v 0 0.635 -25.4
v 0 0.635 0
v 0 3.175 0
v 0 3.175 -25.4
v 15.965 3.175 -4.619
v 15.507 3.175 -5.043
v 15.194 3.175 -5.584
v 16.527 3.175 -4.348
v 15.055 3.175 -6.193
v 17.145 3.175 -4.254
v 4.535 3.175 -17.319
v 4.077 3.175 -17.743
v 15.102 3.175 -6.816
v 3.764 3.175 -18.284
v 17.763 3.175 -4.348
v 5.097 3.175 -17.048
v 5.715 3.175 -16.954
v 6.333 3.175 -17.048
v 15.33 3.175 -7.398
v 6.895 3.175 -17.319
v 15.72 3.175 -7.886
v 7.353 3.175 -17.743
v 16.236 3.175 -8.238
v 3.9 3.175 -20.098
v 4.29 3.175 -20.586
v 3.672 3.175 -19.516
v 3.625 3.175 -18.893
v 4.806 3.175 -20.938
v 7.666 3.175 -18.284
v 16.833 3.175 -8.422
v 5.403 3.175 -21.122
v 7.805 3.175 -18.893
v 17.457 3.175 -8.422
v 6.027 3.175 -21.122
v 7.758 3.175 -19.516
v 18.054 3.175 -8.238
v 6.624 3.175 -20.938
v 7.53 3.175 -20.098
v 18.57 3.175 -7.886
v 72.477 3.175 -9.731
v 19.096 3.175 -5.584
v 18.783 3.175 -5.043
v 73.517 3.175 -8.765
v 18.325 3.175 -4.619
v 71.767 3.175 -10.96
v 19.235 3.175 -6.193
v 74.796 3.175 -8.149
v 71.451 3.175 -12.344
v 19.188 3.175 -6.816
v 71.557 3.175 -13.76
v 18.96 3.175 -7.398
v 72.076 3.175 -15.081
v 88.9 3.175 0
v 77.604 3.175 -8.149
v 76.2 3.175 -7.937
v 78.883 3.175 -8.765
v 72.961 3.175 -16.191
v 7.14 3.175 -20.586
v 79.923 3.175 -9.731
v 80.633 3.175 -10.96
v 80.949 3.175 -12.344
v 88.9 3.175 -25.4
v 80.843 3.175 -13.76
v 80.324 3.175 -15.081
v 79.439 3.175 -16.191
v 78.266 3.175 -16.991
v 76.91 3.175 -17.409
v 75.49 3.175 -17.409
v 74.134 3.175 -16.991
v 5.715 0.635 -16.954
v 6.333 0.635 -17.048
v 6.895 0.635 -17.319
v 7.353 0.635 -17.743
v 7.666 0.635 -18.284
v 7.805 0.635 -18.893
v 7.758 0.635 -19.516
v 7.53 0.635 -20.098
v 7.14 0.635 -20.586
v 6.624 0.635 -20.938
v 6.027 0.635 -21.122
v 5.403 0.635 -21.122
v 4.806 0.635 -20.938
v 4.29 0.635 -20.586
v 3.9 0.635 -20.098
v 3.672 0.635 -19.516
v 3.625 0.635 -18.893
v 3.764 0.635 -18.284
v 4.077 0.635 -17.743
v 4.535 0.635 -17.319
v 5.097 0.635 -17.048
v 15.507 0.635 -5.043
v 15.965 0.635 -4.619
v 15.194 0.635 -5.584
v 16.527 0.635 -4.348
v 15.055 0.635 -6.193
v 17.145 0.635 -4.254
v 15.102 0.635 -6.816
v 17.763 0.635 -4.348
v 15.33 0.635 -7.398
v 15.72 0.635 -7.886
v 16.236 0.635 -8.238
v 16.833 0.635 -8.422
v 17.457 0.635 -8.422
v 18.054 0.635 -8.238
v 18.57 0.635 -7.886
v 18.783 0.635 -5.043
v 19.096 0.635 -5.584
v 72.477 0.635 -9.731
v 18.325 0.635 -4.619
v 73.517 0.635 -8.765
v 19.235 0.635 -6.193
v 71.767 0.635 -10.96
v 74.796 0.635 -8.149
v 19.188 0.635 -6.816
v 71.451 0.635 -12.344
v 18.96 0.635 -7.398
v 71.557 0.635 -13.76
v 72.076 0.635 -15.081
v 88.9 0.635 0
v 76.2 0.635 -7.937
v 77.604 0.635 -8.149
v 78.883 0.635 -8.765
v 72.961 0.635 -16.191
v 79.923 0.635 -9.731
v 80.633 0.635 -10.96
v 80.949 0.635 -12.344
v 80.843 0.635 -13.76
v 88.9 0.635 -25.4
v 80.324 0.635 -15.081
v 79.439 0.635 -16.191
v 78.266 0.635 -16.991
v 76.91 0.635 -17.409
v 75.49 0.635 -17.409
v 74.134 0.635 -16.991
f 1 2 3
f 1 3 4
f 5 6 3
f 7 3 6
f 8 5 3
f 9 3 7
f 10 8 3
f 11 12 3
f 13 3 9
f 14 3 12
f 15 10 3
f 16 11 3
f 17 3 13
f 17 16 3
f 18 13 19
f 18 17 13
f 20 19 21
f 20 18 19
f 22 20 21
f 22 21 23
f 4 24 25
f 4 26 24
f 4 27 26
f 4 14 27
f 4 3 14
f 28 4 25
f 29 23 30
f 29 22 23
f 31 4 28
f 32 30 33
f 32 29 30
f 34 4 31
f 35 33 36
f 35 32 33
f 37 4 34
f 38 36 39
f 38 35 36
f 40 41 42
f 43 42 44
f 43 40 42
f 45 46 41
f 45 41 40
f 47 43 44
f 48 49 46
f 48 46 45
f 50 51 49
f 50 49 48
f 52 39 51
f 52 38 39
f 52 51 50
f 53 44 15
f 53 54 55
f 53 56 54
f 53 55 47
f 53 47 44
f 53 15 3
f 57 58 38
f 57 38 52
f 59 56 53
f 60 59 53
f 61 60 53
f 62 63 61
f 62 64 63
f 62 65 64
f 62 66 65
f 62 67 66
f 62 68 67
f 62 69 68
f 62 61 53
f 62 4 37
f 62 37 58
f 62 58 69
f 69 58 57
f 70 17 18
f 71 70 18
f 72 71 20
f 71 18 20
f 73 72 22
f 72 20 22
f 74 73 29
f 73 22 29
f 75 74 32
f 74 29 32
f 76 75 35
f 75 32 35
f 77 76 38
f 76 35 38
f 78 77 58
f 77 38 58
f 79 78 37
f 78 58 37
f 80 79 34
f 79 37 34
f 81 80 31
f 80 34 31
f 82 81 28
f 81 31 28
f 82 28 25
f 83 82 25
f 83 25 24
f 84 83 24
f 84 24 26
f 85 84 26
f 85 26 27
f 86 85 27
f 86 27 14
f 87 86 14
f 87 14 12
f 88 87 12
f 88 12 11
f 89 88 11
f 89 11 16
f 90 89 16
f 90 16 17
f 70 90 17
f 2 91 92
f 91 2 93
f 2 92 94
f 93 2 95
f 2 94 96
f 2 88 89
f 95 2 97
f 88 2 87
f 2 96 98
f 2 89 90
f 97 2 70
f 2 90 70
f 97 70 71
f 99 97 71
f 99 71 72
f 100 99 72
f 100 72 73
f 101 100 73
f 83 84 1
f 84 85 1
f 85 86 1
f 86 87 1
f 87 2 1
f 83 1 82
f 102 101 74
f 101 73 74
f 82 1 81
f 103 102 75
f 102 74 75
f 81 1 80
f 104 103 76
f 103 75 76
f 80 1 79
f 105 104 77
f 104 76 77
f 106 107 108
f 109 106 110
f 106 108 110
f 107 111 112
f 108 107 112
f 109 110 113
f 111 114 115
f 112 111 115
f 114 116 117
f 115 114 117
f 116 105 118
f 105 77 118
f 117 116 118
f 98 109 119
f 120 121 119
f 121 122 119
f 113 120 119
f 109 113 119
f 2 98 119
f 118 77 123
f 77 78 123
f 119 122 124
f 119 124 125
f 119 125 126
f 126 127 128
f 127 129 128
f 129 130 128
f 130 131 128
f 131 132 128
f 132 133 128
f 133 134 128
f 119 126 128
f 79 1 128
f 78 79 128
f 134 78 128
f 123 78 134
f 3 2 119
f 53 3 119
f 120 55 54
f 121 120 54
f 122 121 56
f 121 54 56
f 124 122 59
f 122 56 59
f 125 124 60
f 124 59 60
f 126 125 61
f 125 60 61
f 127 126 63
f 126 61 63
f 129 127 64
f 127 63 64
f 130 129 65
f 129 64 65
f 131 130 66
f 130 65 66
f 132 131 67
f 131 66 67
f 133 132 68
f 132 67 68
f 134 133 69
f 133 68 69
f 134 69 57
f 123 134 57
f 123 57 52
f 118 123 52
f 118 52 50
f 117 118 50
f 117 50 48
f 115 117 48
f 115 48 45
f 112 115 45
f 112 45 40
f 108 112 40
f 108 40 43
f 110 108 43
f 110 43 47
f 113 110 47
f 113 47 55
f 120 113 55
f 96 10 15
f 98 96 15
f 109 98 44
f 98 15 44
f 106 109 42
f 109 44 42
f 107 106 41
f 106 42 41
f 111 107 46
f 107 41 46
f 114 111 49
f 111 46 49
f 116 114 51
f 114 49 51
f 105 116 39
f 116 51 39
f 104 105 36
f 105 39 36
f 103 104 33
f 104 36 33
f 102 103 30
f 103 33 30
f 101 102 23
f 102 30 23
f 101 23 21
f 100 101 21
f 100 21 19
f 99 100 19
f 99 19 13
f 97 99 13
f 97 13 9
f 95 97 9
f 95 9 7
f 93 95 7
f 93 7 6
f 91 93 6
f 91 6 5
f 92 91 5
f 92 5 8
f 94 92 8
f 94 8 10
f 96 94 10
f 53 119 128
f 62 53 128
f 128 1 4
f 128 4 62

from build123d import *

# Parameters (mm, degrees)
SKETCH1_W                  = 88.9
SKETCH1_H                  = 25.4
BOSS_EXTRUDE1_DEPTH        = 3.175
SKETCH2_R                  = 4.7625
SKETCH2_R_2                = 2.0955
CUT_EXTRUDE1_DEPTH         = 3.175
CONVERT_SOLID1_OUTLINE_W   = 88.9
CONVERT_SOLID1_OUTLINE_H   = 25.4
CONVERT_SOLID1_OUTLINE_R   = 2.0955
CONVERT_SOLID1_OUTLINE_R_2 = 4.7625
CONVERT_SOLID1_DEPTH       = 0.635


# Read off the part's stored shape, not the designer's step: Convert-Solid1
with BuildPart() as part:
    # Sketch1 → Boss-Extrude1 (new body)
    with BuildSketch(Plane(origin=(0, 0, 0), x_dir=(1, 0, 0), z_dir=(0, 1, 0))):
        with Locations((44.45, 12.7)):
            Rectangle(SKETCH1_W, SKETCH1_H)
    extrude(amount=BOSS_EXTRUDE1_DEPTH)

    # Sketch2 → Cut-Extrude1 (cut)
    with BuildSketch(Plane(origin=(0, 3.175, 0), x_dir=(1, 0, 0), z_dir=(0, 1, 0))):
        with Locations(Location((76.2, 12.7, 0), (0, 0, 270))):
            Circle(SKETCH2_R)
        with Locations(Location((5.715, 19.05, 0), (0, 0, 270))):
            Circle(SKETCH2_R_2)
        with Locations(Location((17.145, 6.35, 0), (0, 0, 270))):
            Circle(SKETCH2_R_2)
    extrude(amount=-CUT_EXTRUDE1_DEPTH, mode=Mode.SUBTRACT)

    # Convert-Solid1 outline → Convert-Solid1 (cut)
    with BuildSketch(Plane(origin=(0, 0, 0), x_dir=(1, 0, 0), z_dir=(0, 1, 0))):
        with Locations((44.45, 12.7)):
            Rectangle(CONVERT_SOLID1_OUTLINE_W, CONVERT_SOLID1_OUTLINE_H)
        with Locations((17.145, 6.35)):
            Circle(CONVERT_SOLID1_OUTLINE_R, mode=Mode.SUBTRACT)
        with Locations((76.2, 12.7)):
            Circle(CONVERT_SOLID1_OUTLINE_R_2, mode=Mode.SUBTRACT)
        with Locations((5.715, 19.05)):
            Circle(CONVERT_SOLID1_OUTLINE_R, mode=Mode.SUBTRACT)
    extrude(amount=CONVERT_SOLID1_DEPTH, mode=Mode.SUBTRACT)


solid = part.part
